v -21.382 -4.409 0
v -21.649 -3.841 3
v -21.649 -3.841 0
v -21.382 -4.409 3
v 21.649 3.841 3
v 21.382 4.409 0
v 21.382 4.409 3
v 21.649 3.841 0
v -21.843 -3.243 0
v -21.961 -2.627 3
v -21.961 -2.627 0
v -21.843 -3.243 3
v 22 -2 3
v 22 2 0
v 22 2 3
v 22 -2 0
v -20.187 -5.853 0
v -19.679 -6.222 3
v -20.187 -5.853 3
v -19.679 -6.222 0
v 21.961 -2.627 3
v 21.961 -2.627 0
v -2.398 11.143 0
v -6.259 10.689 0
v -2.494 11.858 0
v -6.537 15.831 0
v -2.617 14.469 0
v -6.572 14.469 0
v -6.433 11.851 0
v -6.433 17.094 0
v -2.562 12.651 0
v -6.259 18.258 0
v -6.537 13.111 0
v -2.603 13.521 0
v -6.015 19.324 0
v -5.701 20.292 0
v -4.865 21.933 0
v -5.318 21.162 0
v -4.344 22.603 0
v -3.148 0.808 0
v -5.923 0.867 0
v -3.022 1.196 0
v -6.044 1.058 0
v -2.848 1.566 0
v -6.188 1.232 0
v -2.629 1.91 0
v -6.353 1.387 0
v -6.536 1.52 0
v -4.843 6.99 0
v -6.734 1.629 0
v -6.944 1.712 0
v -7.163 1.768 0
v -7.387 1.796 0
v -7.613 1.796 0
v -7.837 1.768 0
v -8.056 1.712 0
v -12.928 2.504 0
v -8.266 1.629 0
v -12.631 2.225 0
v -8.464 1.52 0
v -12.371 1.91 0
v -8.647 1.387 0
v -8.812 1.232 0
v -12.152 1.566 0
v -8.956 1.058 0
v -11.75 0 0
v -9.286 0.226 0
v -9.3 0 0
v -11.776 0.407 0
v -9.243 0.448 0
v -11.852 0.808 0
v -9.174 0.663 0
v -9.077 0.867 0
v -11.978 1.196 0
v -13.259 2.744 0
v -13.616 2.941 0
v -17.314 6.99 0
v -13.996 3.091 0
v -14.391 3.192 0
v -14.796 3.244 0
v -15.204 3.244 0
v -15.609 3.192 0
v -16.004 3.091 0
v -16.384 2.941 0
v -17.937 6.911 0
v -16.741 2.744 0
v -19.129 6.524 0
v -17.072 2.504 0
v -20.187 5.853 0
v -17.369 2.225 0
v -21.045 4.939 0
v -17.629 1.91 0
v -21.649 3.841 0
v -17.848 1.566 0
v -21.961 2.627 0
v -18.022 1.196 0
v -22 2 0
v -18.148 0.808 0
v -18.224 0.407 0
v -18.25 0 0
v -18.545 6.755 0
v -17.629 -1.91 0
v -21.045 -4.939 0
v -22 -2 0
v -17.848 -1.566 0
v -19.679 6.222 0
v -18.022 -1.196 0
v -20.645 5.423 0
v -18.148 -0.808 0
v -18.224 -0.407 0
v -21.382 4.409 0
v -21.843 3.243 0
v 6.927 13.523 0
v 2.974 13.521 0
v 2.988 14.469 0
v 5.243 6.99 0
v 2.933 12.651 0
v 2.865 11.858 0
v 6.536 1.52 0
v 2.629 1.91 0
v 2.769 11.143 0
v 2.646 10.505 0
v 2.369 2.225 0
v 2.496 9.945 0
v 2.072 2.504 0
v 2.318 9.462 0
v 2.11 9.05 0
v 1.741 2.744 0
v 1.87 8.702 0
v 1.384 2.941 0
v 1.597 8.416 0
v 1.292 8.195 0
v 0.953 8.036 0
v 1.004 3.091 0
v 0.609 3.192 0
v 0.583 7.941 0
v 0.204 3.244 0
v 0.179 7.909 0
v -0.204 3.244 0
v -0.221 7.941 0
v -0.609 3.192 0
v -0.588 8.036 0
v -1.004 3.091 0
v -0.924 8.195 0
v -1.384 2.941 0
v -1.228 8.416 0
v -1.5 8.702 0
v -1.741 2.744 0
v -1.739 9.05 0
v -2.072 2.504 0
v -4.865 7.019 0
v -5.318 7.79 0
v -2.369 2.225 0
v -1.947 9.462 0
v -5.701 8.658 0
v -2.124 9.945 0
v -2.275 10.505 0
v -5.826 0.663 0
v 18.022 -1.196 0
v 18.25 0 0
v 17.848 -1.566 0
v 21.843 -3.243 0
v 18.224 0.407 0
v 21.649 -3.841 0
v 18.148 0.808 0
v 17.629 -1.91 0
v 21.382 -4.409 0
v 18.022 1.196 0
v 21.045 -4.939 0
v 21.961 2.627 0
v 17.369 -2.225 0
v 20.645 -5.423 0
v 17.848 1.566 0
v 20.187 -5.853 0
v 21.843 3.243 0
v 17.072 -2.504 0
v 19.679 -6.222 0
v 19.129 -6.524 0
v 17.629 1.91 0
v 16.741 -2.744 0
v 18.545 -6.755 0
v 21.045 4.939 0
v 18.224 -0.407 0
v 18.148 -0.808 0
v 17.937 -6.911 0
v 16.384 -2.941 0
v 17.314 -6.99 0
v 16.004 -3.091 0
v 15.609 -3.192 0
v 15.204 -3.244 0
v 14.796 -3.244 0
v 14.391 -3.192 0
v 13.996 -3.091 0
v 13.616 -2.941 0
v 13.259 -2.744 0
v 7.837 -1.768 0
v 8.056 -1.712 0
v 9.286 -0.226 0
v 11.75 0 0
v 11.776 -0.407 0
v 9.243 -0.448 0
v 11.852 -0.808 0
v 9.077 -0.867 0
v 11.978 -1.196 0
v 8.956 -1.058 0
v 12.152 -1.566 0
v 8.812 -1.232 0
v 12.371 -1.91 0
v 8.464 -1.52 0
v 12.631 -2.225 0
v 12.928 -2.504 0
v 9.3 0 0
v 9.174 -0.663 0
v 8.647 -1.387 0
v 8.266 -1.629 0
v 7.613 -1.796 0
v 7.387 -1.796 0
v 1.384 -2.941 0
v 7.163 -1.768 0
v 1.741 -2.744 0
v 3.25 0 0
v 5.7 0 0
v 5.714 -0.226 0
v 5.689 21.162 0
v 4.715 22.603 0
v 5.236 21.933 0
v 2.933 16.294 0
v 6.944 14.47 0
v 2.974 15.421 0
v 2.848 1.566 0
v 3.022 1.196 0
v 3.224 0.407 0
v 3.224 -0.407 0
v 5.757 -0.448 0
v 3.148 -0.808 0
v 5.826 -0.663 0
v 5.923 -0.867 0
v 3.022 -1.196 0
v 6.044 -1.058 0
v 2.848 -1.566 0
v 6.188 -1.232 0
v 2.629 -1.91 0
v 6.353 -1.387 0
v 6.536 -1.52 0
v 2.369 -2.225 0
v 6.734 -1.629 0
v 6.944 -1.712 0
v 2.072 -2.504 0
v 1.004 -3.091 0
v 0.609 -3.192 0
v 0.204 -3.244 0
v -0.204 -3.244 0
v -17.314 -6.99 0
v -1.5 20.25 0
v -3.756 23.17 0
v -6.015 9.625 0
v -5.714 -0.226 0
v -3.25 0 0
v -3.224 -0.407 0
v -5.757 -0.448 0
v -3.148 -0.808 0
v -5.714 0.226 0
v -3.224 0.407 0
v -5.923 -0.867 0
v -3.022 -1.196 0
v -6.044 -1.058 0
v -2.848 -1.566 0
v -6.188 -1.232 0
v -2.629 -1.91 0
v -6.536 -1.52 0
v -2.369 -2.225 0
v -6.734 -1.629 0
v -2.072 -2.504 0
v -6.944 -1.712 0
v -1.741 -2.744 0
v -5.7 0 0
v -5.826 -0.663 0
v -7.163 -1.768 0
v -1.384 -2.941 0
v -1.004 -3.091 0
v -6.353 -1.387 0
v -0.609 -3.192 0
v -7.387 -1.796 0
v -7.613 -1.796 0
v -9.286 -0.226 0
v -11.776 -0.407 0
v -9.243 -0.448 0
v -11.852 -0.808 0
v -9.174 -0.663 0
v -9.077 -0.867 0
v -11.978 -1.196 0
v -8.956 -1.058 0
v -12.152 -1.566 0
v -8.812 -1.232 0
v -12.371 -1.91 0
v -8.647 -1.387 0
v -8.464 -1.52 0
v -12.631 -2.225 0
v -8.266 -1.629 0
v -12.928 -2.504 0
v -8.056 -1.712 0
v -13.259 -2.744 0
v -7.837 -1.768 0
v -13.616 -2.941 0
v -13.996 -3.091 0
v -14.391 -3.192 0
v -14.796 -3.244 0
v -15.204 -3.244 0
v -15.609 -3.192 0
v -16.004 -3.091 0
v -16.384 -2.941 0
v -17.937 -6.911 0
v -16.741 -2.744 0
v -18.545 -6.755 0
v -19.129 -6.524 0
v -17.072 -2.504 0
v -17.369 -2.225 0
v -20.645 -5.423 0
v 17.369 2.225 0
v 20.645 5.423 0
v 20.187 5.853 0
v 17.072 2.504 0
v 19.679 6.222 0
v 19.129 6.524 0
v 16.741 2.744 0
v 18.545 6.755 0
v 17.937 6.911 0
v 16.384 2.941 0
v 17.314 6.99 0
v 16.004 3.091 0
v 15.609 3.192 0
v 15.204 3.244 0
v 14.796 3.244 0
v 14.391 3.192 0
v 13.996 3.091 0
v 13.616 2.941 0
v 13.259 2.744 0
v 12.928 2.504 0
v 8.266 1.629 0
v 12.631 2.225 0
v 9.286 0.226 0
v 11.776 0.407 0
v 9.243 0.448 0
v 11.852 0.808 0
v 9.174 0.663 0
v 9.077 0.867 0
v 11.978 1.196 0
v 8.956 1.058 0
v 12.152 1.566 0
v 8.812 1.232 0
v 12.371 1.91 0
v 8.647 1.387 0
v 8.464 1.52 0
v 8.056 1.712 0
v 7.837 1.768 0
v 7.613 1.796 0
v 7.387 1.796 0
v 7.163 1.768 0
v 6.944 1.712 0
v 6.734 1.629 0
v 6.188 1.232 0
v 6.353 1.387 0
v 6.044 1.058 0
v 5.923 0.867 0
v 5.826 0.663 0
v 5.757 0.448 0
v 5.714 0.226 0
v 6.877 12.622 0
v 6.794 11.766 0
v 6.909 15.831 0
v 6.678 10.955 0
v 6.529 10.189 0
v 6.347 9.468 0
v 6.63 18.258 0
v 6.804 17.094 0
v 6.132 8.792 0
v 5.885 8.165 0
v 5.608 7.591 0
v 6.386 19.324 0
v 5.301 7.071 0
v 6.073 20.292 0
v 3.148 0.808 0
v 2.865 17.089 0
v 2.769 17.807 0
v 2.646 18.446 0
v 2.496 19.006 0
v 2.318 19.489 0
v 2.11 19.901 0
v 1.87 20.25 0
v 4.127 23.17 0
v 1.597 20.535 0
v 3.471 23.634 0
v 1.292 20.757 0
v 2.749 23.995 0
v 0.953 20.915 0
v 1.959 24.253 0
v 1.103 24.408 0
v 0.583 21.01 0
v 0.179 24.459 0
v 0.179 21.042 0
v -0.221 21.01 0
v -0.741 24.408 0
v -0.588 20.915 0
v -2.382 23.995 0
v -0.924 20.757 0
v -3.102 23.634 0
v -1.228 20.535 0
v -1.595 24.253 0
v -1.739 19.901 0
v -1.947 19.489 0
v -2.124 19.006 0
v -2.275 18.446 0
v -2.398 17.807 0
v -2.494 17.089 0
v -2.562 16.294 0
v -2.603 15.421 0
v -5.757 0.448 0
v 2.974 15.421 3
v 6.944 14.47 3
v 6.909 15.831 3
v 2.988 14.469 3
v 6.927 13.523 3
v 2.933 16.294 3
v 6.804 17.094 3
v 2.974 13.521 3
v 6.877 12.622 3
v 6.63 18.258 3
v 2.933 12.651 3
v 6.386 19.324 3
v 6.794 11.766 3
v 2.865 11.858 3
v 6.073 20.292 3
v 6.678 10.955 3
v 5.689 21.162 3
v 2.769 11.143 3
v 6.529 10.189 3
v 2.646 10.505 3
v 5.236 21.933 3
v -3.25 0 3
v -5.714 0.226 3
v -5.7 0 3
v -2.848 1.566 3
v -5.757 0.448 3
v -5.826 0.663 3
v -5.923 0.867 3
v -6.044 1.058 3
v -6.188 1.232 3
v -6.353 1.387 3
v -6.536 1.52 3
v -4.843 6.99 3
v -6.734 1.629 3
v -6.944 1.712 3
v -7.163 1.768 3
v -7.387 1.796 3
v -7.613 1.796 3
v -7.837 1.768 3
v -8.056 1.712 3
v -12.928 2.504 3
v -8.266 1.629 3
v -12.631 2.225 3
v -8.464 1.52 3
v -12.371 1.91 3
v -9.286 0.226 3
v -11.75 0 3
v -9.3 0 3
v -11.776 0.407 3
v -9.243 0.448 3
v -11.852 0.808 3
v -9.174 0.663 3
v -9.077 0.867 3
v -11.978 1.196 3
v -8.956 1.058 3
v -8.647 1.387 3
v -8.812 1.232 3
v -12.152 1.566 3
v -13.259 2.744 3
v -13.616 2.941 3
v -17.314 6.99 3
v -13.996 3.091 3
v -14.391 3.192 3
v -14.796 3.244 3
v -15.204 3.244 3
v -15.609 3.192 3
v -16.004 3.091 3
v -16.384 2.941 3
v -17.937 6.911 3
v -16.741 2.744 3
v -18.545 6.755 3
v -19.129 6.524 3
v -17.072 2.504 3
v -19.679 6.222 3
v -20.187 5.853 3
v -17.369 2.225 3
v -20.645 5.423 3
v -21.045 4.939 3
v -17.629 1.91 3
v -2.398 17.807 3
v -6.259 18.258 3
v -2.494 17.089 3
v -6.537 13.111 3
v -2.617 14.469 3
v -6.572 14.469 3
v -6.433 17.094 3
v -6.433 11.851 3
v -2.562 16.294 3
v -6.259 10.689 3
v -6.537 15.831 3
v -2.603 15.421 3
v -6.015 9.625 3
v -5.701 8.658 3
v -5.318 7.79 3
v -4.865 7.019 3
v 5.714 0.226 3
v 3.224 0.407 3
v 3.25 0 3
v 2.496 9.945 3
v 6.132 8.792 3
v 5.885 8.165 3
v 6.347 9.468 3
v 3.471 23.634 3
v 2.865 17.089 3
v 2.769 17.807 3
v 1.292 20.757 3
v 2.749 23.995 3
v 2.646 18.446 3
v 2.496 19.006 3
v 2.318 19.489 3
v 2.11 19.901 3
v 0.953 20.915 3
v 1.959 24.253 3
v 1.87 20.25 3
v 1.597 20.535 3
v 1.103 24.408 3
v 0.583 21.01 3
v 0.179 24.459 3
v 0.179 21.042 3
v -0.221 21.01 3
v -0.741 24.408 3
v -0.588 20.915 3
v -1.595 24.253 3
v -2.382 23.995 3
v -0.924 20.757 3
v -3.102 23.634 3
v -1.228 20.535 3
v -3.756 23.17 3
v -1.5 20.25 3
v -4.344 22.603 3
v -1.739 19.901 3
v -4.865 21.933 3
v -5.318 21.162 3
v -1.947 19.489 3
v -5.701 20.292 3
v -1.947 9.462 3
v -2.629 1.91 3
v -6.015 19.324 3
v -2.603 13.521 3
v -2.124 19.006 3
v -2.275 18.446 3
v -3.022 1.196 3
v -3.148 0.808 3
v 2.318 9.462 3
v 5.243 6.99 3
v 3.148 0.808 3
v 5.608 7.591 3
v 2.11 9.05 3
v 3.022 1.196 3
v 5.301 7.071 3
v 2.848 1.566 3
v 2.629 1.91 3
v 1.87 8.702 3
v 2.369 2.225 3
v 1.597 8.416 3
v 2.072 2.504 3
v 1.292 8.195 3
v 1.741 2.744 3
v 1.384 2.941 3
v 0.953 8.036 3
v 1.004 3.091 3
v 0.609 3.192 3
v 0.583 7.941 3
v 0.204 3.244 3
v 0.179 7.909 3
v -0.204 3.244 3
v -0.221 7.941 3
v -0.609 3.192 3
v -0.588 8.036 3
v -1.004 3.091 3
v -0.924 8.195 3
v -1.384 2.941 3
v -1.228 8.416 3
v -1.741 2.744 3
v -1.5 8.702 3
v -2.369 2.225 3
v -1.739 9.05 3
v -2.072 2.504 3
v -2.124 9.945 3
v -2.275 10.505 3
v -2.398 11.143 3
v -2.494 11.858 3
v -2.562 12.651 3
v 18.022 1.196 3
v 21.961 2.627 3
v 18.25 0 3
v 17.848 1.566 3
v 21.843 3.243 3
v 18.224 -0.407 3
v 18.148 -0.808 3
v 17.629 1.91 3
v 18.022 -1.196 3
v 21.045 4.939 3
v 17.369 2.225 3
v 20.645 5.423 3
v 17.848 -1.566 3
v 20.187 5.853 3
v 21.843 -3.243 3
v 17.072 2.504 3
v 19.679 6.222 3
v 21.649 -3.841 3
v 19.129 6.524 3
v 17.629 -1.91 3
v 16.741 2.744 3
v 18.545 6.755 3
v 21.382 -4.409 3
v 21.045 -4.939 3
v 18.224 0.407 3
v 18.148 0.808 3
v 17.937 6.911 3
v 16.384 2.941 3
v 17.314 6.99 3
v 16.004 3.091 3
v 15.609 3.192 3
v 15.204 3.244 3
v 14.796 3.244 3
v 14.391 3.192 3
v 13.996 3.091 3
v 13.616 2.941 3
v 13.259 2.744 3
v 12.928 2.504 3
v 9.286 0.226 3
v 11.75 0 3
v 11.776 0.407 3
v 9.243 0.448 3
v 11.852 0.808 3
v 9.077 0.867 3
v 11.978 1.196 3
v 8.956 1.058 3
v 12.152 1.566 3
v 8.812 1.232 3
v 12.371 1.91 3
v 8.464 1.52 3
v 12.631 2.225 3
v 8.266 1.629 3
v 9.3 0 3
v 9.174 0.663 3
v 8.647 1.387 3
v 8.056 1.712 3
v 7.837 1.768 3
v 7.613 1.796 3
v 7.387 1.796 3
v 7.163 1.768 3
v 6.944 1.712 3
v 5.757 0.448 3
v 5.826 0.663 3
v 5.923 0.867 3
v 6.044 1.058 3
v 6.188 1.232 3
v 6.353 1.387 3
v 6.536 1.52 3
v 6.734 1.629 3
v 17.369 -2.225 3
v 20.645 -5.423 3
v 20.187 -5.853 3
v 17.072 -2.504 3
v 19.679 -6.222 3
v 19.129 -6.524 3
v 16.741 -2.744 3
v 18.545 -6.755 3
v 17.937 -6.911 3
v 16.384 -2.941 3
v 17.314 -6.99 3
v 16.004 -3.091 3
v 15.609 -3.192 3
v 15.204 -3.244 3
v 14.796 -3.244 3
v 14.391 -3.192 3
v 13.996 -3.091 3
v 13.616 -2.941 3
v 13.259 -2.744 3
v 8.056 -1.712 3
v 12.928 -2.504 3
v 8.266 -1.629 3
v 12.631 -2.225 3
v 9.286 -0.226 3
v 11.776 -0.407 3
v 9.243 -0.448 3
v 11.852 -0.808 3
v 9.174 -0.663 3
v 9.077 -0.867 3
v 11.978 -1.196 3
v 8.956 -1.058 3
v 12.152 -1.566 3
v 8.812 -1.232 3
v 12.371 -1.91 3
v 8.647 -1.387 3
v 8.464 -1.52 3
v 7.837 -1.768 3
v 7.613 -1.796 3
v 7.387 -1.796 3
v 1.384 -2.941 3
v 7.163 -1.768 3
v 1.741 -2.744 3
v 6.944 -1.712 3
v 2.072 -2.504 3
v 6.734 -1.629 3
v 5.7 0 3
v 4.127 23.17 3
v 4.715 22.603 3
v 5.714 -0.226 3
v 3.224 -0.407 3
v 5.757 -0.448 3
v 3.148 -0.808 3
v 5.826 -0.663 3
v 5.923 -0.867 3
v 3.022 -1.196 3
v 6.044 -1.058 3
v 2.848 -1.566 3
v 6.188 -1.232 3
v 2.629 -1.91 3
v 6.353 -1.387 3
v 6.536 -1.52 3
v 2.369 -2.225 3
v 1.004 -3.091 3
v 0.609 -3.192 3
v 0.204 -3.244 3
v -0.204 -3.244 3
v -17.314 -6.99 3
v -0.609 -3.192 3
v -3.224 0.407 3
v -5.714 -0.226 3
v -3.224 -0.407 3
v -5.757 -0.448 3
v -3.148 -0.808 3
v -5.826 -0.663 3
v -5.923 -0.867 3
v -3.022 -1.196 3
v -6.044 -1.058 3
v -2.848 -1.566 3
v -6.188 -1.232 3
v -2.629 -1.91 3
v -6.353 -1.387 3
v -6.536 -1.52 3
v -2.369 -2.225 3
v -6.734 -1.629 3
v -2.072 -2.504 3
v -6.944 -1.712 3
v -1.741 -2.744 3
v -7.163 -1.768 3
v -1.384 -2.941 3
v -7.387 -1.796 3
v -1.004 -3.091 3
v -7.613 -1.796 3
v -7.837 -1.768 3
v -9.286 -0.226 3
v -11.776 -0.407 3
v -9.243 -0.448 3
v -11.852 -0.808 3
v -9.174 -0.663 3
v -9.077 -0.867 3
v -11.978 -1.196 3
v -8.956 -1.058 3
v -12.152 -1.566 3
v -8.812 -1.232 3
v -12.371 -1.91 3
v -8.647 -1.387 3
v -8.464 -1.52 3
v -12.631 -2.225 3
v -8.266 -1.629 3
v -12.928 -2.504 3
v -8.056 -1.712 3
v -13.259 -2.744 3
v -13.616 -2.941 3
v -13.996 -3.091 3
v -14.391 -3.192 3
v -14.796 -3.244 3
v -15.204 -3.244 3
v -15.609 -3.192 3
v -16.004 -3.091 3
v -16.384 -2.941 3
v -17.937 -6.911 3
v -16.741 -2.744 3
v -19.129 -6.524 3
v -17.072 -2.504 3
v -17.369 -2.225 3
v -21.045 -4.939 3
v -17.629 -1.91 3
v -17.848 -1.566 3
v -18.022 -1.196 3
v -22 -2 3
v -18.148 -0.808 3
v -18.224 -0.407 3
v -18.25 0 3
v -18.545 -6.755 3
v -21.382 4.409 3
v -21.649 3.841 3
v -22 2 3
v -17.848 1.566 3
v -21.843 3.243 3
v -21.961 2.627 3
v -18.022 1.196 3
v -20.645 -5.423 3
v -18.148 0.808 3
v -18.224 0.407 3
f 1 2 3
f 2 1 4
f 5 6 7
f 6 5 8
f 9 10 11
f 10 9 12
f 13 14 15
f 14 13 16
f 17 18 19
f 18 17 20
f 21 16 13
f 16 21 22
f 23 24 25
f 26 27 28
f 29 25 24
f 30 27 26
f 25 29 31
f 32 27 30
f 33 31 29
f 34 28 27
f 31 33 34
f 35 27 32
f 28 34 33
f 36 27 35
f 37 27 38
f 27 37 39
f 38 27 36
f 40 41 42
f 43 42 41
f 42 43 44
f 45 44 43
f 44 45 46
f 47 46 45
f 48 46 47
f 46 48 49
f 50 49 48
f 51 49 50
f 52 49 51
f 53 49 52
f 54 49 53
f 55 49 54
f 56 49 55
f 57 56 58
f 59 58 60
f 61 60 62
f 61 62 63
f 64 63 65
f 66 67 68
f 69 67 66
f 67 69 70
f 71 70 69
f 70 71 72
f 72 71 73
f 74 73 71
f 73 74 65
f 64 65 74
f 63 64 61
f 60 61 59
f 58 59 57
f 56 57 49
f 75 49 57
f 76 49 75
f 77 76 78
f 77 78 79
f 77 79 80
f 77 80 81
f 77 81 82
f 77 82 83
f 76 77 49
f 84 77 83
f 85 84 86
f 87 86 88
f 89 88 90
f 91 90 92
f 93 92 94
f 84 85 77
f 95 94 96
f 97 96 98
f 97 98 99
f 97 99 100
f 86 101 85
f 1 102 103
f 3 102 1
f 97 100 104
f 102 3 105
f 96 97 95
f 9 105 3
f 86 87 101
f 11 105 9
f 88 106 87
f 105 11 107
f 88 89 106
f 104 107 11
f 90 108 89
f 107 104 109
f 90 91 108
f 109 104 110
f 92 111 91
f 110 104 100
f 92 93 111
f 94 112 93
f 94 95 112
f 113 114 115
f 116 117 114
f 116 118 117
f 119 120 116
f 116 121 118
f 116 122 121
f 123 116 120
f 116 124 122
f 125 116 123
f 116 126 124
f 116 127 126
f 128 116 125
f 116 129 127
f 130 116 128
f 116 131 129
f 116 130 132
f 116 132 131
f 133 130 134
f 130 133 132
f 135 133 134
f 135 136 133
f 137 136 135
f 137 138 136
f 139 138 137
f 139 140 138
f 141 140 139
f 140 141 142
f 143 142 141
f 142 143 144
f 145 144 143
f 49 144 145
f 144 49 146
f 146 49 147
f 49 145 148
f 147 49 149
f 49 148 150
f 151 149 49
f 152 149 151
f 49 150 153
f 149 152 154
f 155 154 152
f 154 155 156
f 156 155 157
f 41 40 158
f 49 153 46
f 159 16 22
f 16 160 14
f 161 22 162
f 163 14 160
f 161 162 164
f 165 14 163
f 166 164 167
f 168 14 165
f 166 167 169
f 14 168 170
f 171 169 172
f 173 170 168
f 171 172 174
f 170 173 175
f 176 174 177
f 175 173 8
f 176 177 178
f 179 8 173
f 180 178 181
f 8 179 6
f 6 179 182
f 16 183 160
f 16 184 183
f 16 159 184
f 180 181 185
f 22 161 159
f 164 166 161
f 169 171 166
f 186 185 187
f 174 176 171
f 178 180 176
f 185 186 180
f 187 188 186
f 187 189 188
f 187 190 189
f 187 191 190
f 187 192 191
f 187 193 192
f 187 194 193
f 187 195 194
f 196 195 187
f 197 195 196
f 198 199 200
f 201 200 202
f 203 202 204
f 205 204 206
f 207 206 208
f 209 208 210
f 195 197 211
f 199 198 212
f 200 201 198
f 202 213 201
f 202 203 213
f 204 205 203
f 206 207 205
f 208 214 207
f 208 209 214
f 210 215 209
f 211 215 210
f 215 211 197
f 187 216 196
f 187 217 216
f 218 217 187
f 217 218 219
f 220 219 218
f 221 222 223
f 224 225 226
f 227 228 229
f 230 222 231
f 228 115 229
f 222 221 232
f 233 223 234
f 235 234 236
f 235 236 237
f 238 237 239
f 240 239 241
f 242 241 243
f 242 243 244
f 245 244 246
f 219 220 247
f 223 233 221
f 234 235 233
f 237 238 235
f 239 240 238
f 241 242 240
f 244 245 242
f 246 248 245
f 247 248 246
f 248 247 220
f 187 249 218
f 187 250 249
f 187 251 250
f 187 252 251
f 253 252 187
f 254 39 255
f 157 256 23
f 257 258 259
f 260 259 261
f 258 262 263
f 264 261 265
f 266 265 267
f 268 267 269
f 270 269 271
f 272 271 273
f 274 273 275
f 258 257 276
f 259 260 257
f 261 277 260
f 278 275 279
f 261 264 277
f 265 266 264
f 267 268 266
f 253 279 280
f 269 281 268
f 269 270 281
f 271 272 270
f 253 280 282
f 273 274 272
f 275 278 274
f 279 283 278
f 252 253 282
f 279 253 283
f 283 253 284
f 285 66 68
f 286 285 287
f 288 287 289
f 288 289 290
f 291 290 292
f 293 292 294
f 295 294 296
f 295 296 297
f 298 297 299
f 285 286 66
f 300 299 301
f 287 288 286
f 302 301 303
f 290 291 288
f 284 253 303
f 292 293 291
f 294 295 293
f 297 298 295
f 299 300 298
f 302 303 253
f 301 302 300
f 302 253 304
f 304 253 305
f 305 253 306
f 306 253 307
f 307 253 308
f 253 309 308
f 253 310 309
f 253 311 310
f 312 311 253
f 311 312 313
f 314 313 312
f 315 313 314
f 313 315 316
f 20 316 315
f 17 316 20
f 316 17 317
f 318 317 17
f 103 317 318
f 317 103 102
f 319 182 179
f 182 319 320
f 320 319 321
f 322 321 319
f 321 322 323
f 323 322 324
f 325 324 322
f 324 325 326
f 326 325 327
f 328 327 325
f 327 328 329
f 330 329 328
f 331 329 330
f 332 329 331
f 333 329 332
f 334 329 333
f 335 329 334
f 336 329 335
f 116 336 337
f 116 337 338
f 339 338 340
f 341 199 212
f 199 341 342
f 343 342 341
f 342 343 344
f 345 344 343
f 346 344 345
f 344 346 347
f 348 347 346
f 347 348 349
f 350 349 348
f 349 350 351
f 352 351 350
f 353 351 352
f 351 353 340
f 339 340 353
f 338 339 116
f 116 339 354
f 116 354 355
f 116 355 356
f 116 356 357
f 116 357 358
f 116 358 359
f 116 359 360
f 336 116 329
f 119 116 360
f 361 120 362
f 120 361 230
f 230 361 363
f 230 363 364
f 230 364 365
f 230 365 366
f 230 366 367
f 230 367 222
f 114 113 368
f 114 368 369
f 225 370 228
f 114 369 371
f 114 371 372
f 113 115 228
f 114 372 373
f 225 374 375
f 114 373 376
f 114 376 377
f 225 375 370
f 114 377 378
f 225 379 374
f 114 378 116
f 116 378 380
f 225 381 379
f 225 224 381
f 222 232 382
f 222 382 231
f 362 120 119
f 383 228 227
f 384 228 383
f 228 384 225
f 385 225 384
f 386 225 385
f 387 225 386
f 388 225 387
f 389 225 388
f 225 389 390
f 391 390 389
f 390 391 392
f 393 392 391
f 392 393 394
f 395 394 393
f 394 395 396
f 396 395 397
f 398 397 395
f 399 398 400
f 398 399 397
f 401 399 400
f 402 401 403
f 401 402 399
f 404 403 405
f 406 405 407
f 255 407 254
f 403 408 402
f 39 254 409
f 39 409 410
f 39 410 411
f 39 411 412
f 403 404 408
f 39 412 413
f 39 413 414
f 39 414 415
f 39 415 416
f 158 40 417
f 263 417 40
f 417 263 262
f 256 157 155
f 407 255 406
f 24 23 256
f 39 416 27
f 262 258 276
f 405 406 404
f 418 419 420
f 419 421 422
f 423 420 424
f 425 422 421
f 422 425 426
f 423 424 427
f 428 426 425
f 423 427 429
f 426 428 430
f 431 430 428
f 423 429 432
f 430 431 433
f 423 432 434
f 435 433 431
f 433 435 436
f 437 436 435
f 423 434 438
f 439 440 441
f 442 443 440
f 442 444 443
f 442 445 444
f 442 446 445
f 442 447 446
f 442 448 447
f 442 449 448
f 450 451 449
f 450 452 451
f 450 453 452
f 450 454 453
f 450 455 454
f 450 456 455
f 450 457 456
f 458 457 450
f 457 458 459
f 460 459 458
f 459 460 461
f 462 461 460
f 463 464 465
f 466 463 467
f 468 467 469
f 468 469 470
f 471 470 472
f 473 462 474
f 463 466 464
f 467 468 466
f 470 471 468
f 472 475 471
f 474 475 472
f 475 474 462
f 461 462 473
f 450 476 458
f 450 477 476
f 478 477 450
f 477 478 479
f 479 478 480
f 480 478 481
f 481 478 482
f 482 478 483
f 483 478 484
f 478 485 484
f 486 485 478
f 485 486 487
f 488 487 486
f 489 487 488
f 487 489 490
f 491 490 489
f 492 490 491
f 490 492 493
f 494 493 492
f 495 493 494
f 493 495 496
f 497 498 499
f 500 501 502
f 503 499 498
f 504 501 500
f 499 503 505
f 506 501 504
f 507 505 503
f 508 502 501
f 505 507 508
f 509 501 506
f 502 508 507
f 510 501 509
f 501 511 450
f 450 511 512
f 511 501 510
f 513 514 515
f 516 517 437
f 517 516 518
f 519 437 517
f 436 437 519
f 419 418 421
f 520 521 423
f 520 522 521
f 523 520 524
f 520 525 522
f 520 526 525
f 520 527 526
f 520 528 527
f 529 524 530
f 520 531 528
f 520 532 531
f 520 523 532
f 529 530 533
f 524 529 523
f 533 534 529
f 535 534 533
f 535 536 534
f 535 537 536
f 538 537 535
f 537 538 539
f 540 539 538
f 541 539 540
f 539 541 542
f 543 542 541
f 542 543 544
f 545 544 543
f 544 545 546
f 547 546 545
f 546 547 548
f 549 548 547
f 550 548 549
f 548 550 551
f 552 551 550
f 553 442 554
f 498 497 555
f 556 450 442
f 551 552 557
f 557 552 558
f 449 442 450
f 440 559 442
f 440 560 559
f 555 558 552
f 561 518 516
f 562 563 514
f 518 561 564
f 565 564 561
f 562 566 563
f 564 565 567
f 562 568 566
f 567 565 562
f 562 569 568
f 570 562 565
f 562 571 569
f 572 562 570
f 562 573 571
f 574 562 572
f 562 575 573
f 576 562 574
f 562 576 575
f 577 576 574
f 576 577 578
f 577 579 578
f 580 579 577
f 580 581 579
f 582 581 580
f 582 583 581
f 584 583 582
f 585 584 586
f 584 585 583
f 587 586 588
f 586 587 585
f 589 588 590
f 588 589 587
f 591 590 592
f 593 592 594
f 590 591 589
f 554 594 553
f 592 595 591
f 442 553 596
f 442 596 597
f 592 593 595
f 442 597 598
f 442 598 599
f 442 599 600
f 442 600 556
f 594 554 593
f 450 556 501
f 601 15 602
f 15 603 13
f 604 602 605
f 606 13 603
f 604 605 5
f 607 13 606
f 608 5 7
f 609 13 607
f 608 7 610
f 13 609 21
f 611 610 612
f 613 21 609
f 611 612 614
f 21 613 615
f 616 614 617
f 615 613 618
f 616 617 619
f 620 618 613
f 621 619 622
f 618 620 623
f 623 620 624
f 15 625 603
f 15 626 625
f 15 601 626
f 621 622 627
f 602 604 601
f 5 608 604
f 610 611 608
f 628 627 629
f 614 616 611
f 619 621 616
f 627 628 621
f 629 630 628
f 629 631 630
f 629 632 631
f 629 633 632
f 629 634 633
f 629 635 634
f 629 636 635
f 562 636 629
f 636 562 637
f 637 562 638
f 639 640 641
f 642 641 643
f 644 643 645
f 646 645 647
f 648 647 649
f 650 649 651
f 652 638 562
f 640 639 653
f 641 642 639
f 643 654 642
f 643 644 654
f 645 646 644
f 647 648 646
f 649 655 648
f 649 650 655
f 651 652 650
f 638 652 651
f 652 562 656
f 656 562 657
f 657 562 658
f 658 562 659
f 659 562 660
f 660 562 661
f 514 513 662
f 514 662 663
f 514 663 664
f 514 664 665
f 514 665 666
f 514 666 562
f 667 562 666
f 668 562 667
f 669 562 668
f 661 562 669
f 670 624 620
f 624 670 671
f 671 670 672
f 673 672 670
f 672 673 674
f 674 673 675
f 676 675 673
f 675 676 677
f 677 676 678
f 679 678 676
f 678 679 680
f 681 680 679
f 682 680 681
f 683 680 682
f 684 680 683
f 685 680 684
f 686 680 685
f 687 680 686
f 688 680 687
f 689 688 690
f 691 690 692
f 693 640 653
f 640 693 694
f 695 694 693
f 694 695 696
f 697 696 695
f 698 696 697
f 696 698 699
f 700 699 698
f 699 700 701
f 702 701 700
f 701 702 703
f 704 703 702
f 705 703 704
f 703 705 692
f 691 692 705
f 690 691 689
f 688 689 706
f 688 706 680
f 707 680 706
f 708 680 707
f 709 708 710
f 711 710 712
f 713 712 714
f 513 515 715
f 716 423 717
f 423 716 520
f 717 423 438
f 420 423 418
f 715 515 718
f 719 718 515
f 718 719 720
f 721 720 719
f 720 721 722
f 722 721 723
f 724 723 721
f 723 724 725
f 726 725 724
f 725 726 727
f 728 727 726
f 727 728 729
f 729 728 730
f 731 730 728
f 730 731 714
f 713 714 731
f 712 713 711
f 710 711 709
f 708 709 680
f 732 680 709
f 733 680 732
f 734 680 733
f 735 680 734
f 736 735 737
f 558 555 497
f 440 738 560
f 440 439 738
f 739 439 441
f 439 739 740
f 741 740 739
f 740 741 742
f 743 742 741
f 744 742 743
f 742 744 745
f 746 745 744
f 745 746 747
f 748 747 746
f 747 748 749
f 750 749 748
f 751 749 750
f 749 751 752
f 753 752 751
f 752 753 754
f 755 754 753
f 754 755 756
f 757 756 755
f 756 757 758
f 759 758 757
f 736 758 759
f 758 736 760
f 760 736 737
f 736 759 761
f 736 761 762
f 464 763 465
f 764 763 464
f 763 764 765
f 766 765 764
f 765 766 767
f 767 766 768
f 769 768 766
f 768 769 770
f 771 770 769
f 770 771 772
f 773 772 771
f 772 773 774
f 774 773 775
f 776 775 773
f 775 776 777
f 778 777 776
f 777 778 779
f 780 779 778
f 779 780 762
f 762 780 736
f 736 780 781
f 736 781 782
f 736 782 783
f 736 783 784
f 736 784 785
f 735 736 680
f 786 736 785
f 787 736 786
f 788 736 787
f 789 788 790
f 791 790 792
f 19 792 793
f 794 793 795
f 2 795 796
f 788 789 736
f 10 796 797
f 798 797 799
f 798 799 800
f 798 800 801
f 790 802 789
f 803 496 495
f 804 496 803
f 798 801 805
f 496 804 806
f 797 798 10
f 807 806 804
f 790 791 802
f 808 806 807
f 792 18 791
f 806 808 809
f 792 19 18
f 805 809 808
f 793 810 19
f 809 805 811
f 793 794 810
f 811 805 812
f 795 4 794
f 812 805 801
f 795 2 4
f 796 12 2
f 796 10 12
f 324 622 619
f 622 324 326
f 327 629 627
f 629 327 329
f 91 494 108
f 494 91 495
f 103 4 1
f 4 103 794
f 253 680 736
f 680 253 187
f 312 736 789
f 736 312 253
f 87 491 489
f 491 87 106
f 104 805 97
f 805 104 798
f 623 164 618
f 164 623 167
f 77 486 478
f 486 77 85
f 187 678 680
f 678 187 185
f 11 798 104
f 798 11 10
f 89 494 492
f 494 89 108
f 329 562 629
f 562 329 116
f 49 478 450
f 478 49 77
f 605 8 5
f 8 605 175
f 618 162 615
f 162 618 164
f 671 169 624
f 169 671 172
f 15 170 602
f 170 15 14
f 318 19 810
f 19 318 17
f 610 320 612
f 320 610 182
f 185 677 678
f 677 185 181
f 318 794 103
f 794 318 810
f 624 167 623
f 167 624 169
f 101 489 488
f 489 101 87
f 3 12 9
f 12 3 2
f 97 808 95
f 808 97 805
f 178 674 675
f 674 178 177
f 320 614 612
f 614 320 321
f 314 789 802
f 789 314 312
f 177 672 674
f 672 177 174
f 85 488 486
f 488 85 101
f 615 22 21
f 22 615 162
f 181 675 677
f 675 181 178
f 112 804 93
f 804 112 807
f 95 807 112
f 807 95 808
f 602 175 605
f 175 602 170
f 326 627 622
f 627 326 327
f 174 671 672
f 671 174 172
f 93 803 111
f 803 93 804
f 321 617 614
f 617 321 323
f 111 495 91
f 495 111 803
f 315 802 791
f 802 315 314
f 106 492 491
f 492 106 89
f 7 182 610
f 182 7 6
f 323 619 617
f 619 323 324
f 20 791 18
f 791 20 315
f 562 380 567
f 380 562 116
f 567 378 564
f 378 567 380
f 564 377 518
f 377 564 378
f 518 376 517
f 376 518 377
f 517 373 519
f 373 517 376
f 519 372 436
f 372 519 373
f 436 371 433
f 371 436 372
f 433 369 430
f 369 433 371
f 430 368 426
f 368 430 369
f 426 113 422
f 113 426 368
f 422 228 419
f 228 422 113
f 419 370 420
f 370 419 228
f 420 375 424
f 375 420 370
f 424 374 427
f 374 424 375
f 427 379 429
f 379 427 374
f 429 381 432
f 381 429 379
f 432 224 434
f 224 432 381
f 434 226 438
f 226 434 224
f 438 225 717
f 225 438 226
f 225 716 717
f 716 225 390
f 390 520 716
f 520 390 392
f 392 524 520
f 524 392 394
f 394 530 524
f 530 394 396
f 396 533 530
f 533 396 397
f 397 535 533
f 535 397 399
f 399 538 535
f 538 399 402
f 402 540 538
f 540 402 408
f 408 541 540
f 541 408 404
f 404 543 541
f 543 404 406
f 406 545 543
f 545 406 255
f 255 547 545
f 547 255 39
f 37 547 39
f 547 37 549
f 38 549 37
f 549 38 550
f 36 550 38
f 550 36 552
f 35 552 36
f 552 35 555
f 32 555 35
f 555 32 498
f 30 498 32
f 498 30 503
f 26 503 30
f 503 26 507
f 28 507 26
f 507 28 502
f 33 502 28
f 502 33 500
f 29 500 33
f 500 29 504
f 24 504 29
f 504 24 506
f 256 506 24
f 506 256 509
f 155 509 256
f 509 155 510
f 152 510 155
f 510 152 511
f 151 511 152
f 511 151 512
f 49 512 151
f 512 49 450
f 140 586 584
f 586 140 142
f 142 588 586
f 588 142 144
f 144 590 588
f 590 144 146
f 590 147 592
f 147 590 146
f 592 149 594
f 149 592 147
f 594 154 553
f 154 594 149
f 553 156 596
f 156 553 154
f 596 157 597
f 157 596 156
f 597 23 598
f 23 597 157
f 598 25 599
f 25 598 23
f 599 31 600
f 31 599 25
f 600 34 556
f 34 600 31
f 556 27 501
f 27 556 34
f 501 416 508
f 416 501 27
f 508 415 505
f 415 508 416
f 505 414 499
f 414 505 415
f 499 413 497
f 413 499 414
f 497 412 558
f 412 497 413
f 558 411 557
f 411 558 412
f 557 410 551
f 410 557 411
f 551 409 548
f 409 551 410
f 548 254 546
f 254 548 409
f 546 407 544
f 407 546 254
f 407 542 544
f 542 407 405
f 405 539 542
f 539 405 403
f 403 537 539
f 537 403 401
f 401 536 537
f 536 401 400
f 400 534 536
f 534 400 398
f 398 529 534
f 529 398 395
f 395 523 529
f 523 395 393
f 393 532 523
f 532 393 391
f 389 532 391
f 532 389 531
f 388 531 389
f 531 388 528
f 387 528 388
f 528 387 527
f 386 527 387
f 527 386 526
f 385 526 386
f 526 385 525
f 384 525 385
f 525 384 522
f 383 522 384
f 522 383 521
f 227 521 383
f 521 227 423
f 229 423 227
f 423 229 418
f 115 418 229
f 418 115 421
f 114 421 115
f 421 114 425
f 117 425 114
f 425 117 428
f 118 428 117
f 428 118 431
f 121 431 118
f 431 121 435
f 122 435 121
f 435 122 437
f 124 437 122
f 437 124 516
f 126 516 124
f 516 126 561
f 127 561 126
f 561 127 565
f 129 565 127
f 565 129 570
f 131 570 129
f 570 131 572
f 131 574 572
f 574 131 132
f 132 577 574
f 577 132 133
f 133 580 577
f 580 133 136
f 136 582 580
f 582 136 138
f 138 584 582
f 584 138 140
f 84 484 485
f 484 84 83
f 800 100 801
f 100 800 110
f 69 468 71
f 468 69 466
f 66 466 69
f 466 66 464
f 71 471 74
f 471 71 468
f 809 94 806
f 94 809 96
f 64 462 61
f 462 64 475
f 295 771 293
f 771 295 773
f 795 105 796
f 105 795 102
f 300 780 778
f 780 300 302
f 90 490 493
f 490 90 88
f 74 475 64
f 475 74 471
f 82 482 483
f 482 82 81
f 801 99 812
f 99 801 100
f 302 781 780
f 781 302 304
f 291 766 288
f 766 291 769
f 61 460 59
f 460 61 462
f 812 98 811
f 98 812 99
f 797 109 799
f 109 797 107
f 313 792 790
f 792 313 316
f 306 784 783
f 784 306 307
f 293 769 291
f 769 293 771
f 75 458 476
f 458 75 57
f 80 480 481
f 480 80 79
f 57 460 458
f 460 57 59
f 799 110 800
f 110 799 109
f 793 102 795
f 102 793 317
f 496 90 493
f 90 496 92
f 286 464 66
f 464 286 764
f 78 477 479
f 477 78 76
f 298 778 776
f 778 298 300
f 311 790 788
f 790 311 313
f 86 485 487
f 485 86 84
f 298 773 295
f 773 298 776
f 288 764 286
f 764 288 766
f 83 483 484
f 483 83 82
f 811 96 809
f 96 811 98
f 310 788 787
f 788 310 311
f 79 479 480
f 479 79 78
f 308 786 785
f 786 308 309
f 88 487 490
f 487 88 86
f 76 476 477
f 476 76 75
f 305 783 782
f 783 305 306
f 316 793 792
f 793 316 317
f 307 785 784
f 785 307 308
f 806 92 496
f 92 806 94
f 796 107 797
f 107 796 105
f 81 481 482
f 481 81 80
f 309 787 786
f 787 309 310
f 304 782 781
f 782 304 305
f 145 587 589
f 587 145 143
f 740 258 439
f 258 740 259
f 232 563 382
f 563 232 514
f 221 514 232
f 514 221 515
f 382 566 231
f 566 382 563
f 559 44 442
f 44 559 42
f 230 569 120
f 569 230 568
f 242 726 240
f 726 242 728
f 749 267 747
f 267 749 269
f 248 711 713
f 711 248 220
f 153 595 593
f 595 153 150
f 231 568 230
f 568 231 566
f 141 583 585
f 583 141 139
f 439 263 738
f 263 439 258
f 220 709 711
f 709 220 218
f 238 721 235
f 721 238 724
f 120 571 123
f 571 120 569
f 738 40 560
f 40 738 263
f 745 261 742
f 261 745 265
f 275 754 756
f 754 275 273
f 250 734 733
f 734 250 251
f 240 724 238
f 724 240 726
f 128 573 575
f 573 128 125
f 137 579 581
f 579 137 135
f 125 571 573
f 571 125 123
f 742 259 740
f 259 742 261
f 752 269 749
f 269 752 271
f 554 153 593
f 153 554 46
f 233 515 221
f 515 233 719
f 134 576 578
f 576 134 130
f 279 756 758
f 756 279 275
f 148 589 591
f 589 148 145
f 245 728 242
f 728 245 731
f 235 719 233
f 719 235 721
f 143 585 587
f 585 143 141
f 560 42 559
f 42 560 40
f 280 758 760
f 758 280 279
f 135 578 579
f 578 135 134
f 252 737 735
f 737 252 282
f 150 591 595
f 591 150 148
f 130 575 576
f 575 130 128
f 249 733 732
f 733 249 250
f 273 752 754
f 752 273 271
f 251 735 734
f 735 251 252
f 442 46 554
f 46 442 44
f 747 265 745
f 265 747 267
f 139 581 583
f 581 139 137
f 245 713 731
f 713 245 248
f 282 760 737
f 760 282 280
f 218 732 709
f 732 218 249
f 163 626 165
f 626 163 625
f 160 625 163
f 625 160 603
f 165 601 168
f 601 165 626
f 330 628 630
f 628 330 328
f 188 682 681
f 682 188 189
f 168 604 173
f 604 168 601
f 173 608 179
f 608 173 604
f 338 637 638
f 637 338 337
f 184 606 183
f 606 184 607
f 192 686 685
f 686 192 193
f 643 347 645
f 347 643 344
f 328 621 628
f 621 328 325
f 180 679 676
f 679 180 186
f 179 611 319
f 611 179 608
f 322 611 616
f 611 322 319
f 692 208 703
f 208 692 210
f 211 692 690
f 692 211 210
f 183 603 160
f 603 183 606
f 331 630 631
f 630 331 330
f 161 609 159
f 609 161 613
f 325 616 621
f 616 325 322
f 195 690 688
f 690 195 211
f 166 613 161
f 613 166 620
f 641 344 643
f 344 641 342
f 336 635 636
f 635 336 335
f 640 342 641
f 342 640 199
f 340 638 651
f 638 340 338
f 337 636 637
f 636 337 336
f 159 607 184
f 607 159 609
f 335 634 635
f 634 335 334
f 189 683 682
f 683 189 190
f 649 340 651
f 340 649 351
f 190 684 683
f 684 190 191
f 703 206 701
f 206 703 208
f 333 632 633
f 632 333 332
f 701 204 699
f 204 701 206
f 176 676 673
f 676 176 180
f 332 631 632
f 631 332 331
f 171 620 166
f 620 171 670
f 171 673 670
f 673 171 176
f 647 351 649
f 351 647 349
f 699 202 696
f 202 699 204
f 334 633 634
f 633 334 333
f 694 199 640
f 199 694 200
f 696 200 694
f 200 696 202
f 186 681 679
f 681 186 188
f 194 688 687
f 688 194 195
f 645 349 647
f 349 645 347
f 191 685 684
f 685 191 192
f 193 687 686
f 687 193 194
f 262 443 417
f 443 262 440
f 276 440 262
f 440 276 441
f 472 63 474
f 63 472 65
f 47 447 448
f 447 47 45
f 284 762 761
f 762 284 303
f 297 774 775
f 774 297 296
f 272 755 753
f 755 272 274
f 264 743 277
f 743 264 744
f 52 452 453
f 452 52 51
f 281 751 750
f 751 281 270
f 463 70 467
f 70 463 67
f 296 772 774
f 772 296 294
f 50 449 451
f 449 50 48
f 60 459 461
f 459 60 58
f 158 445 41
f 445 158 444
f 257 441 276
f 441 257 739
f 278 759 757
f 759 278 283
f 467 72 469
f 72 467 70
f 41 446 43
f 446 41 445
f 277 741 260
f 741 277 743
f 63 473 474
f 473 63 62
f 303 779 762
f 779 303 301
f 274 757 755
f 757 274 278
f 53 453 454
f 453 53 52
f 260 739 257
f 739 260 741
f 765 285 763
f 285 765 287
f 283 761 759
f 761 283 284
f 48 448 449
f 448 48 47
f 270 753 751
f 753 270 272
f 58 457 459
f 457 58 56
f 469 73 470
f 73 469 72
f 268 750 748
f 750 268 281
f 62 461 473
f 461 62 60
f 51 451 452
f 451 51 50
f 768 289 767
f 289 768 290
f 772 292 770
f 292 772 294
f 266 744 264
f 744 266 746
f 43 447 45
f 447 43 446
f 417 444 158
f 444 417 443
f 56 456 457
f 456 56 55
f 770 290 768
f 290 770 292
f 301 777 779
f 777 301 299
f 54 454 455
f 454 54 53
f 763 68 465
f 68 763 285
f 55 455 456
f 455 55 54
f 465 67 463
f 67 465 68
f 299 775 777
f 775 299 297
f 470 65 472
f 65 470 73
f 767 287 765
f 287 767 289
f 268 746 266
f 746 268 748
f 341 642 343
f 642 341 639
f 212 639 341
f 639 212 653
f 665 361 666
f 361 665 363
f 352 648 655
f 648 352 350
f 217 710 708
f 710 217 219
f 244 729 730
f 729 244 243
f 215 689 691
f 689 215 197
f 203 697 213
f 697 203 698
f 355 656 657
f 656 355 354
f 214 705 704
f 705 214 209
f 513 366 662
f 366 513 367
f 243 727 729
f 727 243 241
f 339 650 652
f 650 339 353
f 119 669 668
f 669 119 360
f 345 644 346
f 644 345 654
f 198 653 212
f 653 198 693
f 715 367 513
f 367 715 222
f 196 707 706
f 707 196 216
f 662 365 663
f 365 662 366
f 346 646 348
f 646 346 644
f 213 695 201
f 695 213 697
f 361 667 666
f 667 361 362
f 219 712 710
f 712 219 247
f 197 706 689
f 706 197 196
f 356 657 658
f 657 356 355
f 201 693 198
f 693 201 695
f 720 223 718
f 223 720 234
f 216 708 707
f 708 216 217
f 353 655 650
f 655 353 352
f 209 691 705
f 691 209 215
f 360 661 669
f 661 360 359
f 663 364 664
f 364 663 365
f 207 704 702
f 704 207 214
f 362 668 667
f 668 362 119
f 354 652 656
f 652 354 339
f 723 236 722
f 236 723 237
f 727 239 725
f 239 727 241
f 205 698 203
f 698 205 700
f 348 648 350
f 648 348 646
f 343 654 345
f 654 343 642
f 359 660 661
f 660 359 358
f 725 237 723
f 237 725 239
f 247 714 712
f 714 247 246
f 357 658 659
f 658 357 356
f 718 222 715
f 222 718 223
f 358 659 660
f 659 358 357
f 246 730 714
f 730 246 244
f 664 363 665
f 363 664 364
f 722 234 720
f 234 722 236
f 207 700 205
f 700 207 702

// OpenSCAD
$fn = 50;


difference() {
	union() {
		hull() {
			translate(v = [-17.0000000000, 2.0000000000, 0]) {
				cylinder(h = 3, r = 5);
			}
			translate(v = [17.0000000000, 2.0000000000, 0]) {
				cylinder(h = 3, r = 5);
			}
			translate(v = [-17.0000000000, -2.0000000000, 0]) {
				cylinder(h = 3, r = 5);
			}
			translate(v = [17.0000000000, -2.0000000000, 0]) {
				cylinder(h = 3, r = 5);
			}
		}
		translate(v = [0, 24, 0]) {
			linear_extrude(height = 3) {
				text(font = "DejaVu Sans Mono:style=Bold", halign = "center", size = 19.0000000000, text = "Q", valign = "top");
			}
		}
	}
	union() {
		translate(v = [-15.0000000000, 0.0000000000, 0]) {
			translate(v = [0, 0, -100]) {
				cylinder(h = 200, r = 3.2500000000);
			}
		}
		translate(v = [0, 0, -100]) {
			cylinder(h = 200, r = 3.2500000000);
		}
		translate(v = [15.0000000000, 0.0000000000, 0]) {
			translate(v = [0, 0, -100]) {
				cylinder(h = 200, r = 3.2500000000);
			}
		}
		translate(v = [-15.0000000000, 0.0000000000, 0]) {
			translate(v = [0, 0, -100]) {
				cylinder(h = 200, r = 1.8000000000);
			}
		}
		translate(v = [-7.5000000000, 0.0000000000, 0]) {
			translate(v = [0, 0, -100]) {
				cylinder(h = 200, r = 1.8000000000);
			}
		}
		translate(v = [0, 0, -100]) {
			cylinder(h = 200, r = 1.8000000000);
		}
		translate(v = [7.5000000000, 0.0000000000, 0]) {
			translate(v = [0, 0, -100]) {
				cylinder(h = 200, r = 1.8000000000);
			}
		}
		translate(v = [15.0000000000, 0.0000000000, 0]) {
			translate(v = [0, 0, -100]) {
				cylinder(h = 200, r = 1.8000000000);
			}
		}
	}
}
